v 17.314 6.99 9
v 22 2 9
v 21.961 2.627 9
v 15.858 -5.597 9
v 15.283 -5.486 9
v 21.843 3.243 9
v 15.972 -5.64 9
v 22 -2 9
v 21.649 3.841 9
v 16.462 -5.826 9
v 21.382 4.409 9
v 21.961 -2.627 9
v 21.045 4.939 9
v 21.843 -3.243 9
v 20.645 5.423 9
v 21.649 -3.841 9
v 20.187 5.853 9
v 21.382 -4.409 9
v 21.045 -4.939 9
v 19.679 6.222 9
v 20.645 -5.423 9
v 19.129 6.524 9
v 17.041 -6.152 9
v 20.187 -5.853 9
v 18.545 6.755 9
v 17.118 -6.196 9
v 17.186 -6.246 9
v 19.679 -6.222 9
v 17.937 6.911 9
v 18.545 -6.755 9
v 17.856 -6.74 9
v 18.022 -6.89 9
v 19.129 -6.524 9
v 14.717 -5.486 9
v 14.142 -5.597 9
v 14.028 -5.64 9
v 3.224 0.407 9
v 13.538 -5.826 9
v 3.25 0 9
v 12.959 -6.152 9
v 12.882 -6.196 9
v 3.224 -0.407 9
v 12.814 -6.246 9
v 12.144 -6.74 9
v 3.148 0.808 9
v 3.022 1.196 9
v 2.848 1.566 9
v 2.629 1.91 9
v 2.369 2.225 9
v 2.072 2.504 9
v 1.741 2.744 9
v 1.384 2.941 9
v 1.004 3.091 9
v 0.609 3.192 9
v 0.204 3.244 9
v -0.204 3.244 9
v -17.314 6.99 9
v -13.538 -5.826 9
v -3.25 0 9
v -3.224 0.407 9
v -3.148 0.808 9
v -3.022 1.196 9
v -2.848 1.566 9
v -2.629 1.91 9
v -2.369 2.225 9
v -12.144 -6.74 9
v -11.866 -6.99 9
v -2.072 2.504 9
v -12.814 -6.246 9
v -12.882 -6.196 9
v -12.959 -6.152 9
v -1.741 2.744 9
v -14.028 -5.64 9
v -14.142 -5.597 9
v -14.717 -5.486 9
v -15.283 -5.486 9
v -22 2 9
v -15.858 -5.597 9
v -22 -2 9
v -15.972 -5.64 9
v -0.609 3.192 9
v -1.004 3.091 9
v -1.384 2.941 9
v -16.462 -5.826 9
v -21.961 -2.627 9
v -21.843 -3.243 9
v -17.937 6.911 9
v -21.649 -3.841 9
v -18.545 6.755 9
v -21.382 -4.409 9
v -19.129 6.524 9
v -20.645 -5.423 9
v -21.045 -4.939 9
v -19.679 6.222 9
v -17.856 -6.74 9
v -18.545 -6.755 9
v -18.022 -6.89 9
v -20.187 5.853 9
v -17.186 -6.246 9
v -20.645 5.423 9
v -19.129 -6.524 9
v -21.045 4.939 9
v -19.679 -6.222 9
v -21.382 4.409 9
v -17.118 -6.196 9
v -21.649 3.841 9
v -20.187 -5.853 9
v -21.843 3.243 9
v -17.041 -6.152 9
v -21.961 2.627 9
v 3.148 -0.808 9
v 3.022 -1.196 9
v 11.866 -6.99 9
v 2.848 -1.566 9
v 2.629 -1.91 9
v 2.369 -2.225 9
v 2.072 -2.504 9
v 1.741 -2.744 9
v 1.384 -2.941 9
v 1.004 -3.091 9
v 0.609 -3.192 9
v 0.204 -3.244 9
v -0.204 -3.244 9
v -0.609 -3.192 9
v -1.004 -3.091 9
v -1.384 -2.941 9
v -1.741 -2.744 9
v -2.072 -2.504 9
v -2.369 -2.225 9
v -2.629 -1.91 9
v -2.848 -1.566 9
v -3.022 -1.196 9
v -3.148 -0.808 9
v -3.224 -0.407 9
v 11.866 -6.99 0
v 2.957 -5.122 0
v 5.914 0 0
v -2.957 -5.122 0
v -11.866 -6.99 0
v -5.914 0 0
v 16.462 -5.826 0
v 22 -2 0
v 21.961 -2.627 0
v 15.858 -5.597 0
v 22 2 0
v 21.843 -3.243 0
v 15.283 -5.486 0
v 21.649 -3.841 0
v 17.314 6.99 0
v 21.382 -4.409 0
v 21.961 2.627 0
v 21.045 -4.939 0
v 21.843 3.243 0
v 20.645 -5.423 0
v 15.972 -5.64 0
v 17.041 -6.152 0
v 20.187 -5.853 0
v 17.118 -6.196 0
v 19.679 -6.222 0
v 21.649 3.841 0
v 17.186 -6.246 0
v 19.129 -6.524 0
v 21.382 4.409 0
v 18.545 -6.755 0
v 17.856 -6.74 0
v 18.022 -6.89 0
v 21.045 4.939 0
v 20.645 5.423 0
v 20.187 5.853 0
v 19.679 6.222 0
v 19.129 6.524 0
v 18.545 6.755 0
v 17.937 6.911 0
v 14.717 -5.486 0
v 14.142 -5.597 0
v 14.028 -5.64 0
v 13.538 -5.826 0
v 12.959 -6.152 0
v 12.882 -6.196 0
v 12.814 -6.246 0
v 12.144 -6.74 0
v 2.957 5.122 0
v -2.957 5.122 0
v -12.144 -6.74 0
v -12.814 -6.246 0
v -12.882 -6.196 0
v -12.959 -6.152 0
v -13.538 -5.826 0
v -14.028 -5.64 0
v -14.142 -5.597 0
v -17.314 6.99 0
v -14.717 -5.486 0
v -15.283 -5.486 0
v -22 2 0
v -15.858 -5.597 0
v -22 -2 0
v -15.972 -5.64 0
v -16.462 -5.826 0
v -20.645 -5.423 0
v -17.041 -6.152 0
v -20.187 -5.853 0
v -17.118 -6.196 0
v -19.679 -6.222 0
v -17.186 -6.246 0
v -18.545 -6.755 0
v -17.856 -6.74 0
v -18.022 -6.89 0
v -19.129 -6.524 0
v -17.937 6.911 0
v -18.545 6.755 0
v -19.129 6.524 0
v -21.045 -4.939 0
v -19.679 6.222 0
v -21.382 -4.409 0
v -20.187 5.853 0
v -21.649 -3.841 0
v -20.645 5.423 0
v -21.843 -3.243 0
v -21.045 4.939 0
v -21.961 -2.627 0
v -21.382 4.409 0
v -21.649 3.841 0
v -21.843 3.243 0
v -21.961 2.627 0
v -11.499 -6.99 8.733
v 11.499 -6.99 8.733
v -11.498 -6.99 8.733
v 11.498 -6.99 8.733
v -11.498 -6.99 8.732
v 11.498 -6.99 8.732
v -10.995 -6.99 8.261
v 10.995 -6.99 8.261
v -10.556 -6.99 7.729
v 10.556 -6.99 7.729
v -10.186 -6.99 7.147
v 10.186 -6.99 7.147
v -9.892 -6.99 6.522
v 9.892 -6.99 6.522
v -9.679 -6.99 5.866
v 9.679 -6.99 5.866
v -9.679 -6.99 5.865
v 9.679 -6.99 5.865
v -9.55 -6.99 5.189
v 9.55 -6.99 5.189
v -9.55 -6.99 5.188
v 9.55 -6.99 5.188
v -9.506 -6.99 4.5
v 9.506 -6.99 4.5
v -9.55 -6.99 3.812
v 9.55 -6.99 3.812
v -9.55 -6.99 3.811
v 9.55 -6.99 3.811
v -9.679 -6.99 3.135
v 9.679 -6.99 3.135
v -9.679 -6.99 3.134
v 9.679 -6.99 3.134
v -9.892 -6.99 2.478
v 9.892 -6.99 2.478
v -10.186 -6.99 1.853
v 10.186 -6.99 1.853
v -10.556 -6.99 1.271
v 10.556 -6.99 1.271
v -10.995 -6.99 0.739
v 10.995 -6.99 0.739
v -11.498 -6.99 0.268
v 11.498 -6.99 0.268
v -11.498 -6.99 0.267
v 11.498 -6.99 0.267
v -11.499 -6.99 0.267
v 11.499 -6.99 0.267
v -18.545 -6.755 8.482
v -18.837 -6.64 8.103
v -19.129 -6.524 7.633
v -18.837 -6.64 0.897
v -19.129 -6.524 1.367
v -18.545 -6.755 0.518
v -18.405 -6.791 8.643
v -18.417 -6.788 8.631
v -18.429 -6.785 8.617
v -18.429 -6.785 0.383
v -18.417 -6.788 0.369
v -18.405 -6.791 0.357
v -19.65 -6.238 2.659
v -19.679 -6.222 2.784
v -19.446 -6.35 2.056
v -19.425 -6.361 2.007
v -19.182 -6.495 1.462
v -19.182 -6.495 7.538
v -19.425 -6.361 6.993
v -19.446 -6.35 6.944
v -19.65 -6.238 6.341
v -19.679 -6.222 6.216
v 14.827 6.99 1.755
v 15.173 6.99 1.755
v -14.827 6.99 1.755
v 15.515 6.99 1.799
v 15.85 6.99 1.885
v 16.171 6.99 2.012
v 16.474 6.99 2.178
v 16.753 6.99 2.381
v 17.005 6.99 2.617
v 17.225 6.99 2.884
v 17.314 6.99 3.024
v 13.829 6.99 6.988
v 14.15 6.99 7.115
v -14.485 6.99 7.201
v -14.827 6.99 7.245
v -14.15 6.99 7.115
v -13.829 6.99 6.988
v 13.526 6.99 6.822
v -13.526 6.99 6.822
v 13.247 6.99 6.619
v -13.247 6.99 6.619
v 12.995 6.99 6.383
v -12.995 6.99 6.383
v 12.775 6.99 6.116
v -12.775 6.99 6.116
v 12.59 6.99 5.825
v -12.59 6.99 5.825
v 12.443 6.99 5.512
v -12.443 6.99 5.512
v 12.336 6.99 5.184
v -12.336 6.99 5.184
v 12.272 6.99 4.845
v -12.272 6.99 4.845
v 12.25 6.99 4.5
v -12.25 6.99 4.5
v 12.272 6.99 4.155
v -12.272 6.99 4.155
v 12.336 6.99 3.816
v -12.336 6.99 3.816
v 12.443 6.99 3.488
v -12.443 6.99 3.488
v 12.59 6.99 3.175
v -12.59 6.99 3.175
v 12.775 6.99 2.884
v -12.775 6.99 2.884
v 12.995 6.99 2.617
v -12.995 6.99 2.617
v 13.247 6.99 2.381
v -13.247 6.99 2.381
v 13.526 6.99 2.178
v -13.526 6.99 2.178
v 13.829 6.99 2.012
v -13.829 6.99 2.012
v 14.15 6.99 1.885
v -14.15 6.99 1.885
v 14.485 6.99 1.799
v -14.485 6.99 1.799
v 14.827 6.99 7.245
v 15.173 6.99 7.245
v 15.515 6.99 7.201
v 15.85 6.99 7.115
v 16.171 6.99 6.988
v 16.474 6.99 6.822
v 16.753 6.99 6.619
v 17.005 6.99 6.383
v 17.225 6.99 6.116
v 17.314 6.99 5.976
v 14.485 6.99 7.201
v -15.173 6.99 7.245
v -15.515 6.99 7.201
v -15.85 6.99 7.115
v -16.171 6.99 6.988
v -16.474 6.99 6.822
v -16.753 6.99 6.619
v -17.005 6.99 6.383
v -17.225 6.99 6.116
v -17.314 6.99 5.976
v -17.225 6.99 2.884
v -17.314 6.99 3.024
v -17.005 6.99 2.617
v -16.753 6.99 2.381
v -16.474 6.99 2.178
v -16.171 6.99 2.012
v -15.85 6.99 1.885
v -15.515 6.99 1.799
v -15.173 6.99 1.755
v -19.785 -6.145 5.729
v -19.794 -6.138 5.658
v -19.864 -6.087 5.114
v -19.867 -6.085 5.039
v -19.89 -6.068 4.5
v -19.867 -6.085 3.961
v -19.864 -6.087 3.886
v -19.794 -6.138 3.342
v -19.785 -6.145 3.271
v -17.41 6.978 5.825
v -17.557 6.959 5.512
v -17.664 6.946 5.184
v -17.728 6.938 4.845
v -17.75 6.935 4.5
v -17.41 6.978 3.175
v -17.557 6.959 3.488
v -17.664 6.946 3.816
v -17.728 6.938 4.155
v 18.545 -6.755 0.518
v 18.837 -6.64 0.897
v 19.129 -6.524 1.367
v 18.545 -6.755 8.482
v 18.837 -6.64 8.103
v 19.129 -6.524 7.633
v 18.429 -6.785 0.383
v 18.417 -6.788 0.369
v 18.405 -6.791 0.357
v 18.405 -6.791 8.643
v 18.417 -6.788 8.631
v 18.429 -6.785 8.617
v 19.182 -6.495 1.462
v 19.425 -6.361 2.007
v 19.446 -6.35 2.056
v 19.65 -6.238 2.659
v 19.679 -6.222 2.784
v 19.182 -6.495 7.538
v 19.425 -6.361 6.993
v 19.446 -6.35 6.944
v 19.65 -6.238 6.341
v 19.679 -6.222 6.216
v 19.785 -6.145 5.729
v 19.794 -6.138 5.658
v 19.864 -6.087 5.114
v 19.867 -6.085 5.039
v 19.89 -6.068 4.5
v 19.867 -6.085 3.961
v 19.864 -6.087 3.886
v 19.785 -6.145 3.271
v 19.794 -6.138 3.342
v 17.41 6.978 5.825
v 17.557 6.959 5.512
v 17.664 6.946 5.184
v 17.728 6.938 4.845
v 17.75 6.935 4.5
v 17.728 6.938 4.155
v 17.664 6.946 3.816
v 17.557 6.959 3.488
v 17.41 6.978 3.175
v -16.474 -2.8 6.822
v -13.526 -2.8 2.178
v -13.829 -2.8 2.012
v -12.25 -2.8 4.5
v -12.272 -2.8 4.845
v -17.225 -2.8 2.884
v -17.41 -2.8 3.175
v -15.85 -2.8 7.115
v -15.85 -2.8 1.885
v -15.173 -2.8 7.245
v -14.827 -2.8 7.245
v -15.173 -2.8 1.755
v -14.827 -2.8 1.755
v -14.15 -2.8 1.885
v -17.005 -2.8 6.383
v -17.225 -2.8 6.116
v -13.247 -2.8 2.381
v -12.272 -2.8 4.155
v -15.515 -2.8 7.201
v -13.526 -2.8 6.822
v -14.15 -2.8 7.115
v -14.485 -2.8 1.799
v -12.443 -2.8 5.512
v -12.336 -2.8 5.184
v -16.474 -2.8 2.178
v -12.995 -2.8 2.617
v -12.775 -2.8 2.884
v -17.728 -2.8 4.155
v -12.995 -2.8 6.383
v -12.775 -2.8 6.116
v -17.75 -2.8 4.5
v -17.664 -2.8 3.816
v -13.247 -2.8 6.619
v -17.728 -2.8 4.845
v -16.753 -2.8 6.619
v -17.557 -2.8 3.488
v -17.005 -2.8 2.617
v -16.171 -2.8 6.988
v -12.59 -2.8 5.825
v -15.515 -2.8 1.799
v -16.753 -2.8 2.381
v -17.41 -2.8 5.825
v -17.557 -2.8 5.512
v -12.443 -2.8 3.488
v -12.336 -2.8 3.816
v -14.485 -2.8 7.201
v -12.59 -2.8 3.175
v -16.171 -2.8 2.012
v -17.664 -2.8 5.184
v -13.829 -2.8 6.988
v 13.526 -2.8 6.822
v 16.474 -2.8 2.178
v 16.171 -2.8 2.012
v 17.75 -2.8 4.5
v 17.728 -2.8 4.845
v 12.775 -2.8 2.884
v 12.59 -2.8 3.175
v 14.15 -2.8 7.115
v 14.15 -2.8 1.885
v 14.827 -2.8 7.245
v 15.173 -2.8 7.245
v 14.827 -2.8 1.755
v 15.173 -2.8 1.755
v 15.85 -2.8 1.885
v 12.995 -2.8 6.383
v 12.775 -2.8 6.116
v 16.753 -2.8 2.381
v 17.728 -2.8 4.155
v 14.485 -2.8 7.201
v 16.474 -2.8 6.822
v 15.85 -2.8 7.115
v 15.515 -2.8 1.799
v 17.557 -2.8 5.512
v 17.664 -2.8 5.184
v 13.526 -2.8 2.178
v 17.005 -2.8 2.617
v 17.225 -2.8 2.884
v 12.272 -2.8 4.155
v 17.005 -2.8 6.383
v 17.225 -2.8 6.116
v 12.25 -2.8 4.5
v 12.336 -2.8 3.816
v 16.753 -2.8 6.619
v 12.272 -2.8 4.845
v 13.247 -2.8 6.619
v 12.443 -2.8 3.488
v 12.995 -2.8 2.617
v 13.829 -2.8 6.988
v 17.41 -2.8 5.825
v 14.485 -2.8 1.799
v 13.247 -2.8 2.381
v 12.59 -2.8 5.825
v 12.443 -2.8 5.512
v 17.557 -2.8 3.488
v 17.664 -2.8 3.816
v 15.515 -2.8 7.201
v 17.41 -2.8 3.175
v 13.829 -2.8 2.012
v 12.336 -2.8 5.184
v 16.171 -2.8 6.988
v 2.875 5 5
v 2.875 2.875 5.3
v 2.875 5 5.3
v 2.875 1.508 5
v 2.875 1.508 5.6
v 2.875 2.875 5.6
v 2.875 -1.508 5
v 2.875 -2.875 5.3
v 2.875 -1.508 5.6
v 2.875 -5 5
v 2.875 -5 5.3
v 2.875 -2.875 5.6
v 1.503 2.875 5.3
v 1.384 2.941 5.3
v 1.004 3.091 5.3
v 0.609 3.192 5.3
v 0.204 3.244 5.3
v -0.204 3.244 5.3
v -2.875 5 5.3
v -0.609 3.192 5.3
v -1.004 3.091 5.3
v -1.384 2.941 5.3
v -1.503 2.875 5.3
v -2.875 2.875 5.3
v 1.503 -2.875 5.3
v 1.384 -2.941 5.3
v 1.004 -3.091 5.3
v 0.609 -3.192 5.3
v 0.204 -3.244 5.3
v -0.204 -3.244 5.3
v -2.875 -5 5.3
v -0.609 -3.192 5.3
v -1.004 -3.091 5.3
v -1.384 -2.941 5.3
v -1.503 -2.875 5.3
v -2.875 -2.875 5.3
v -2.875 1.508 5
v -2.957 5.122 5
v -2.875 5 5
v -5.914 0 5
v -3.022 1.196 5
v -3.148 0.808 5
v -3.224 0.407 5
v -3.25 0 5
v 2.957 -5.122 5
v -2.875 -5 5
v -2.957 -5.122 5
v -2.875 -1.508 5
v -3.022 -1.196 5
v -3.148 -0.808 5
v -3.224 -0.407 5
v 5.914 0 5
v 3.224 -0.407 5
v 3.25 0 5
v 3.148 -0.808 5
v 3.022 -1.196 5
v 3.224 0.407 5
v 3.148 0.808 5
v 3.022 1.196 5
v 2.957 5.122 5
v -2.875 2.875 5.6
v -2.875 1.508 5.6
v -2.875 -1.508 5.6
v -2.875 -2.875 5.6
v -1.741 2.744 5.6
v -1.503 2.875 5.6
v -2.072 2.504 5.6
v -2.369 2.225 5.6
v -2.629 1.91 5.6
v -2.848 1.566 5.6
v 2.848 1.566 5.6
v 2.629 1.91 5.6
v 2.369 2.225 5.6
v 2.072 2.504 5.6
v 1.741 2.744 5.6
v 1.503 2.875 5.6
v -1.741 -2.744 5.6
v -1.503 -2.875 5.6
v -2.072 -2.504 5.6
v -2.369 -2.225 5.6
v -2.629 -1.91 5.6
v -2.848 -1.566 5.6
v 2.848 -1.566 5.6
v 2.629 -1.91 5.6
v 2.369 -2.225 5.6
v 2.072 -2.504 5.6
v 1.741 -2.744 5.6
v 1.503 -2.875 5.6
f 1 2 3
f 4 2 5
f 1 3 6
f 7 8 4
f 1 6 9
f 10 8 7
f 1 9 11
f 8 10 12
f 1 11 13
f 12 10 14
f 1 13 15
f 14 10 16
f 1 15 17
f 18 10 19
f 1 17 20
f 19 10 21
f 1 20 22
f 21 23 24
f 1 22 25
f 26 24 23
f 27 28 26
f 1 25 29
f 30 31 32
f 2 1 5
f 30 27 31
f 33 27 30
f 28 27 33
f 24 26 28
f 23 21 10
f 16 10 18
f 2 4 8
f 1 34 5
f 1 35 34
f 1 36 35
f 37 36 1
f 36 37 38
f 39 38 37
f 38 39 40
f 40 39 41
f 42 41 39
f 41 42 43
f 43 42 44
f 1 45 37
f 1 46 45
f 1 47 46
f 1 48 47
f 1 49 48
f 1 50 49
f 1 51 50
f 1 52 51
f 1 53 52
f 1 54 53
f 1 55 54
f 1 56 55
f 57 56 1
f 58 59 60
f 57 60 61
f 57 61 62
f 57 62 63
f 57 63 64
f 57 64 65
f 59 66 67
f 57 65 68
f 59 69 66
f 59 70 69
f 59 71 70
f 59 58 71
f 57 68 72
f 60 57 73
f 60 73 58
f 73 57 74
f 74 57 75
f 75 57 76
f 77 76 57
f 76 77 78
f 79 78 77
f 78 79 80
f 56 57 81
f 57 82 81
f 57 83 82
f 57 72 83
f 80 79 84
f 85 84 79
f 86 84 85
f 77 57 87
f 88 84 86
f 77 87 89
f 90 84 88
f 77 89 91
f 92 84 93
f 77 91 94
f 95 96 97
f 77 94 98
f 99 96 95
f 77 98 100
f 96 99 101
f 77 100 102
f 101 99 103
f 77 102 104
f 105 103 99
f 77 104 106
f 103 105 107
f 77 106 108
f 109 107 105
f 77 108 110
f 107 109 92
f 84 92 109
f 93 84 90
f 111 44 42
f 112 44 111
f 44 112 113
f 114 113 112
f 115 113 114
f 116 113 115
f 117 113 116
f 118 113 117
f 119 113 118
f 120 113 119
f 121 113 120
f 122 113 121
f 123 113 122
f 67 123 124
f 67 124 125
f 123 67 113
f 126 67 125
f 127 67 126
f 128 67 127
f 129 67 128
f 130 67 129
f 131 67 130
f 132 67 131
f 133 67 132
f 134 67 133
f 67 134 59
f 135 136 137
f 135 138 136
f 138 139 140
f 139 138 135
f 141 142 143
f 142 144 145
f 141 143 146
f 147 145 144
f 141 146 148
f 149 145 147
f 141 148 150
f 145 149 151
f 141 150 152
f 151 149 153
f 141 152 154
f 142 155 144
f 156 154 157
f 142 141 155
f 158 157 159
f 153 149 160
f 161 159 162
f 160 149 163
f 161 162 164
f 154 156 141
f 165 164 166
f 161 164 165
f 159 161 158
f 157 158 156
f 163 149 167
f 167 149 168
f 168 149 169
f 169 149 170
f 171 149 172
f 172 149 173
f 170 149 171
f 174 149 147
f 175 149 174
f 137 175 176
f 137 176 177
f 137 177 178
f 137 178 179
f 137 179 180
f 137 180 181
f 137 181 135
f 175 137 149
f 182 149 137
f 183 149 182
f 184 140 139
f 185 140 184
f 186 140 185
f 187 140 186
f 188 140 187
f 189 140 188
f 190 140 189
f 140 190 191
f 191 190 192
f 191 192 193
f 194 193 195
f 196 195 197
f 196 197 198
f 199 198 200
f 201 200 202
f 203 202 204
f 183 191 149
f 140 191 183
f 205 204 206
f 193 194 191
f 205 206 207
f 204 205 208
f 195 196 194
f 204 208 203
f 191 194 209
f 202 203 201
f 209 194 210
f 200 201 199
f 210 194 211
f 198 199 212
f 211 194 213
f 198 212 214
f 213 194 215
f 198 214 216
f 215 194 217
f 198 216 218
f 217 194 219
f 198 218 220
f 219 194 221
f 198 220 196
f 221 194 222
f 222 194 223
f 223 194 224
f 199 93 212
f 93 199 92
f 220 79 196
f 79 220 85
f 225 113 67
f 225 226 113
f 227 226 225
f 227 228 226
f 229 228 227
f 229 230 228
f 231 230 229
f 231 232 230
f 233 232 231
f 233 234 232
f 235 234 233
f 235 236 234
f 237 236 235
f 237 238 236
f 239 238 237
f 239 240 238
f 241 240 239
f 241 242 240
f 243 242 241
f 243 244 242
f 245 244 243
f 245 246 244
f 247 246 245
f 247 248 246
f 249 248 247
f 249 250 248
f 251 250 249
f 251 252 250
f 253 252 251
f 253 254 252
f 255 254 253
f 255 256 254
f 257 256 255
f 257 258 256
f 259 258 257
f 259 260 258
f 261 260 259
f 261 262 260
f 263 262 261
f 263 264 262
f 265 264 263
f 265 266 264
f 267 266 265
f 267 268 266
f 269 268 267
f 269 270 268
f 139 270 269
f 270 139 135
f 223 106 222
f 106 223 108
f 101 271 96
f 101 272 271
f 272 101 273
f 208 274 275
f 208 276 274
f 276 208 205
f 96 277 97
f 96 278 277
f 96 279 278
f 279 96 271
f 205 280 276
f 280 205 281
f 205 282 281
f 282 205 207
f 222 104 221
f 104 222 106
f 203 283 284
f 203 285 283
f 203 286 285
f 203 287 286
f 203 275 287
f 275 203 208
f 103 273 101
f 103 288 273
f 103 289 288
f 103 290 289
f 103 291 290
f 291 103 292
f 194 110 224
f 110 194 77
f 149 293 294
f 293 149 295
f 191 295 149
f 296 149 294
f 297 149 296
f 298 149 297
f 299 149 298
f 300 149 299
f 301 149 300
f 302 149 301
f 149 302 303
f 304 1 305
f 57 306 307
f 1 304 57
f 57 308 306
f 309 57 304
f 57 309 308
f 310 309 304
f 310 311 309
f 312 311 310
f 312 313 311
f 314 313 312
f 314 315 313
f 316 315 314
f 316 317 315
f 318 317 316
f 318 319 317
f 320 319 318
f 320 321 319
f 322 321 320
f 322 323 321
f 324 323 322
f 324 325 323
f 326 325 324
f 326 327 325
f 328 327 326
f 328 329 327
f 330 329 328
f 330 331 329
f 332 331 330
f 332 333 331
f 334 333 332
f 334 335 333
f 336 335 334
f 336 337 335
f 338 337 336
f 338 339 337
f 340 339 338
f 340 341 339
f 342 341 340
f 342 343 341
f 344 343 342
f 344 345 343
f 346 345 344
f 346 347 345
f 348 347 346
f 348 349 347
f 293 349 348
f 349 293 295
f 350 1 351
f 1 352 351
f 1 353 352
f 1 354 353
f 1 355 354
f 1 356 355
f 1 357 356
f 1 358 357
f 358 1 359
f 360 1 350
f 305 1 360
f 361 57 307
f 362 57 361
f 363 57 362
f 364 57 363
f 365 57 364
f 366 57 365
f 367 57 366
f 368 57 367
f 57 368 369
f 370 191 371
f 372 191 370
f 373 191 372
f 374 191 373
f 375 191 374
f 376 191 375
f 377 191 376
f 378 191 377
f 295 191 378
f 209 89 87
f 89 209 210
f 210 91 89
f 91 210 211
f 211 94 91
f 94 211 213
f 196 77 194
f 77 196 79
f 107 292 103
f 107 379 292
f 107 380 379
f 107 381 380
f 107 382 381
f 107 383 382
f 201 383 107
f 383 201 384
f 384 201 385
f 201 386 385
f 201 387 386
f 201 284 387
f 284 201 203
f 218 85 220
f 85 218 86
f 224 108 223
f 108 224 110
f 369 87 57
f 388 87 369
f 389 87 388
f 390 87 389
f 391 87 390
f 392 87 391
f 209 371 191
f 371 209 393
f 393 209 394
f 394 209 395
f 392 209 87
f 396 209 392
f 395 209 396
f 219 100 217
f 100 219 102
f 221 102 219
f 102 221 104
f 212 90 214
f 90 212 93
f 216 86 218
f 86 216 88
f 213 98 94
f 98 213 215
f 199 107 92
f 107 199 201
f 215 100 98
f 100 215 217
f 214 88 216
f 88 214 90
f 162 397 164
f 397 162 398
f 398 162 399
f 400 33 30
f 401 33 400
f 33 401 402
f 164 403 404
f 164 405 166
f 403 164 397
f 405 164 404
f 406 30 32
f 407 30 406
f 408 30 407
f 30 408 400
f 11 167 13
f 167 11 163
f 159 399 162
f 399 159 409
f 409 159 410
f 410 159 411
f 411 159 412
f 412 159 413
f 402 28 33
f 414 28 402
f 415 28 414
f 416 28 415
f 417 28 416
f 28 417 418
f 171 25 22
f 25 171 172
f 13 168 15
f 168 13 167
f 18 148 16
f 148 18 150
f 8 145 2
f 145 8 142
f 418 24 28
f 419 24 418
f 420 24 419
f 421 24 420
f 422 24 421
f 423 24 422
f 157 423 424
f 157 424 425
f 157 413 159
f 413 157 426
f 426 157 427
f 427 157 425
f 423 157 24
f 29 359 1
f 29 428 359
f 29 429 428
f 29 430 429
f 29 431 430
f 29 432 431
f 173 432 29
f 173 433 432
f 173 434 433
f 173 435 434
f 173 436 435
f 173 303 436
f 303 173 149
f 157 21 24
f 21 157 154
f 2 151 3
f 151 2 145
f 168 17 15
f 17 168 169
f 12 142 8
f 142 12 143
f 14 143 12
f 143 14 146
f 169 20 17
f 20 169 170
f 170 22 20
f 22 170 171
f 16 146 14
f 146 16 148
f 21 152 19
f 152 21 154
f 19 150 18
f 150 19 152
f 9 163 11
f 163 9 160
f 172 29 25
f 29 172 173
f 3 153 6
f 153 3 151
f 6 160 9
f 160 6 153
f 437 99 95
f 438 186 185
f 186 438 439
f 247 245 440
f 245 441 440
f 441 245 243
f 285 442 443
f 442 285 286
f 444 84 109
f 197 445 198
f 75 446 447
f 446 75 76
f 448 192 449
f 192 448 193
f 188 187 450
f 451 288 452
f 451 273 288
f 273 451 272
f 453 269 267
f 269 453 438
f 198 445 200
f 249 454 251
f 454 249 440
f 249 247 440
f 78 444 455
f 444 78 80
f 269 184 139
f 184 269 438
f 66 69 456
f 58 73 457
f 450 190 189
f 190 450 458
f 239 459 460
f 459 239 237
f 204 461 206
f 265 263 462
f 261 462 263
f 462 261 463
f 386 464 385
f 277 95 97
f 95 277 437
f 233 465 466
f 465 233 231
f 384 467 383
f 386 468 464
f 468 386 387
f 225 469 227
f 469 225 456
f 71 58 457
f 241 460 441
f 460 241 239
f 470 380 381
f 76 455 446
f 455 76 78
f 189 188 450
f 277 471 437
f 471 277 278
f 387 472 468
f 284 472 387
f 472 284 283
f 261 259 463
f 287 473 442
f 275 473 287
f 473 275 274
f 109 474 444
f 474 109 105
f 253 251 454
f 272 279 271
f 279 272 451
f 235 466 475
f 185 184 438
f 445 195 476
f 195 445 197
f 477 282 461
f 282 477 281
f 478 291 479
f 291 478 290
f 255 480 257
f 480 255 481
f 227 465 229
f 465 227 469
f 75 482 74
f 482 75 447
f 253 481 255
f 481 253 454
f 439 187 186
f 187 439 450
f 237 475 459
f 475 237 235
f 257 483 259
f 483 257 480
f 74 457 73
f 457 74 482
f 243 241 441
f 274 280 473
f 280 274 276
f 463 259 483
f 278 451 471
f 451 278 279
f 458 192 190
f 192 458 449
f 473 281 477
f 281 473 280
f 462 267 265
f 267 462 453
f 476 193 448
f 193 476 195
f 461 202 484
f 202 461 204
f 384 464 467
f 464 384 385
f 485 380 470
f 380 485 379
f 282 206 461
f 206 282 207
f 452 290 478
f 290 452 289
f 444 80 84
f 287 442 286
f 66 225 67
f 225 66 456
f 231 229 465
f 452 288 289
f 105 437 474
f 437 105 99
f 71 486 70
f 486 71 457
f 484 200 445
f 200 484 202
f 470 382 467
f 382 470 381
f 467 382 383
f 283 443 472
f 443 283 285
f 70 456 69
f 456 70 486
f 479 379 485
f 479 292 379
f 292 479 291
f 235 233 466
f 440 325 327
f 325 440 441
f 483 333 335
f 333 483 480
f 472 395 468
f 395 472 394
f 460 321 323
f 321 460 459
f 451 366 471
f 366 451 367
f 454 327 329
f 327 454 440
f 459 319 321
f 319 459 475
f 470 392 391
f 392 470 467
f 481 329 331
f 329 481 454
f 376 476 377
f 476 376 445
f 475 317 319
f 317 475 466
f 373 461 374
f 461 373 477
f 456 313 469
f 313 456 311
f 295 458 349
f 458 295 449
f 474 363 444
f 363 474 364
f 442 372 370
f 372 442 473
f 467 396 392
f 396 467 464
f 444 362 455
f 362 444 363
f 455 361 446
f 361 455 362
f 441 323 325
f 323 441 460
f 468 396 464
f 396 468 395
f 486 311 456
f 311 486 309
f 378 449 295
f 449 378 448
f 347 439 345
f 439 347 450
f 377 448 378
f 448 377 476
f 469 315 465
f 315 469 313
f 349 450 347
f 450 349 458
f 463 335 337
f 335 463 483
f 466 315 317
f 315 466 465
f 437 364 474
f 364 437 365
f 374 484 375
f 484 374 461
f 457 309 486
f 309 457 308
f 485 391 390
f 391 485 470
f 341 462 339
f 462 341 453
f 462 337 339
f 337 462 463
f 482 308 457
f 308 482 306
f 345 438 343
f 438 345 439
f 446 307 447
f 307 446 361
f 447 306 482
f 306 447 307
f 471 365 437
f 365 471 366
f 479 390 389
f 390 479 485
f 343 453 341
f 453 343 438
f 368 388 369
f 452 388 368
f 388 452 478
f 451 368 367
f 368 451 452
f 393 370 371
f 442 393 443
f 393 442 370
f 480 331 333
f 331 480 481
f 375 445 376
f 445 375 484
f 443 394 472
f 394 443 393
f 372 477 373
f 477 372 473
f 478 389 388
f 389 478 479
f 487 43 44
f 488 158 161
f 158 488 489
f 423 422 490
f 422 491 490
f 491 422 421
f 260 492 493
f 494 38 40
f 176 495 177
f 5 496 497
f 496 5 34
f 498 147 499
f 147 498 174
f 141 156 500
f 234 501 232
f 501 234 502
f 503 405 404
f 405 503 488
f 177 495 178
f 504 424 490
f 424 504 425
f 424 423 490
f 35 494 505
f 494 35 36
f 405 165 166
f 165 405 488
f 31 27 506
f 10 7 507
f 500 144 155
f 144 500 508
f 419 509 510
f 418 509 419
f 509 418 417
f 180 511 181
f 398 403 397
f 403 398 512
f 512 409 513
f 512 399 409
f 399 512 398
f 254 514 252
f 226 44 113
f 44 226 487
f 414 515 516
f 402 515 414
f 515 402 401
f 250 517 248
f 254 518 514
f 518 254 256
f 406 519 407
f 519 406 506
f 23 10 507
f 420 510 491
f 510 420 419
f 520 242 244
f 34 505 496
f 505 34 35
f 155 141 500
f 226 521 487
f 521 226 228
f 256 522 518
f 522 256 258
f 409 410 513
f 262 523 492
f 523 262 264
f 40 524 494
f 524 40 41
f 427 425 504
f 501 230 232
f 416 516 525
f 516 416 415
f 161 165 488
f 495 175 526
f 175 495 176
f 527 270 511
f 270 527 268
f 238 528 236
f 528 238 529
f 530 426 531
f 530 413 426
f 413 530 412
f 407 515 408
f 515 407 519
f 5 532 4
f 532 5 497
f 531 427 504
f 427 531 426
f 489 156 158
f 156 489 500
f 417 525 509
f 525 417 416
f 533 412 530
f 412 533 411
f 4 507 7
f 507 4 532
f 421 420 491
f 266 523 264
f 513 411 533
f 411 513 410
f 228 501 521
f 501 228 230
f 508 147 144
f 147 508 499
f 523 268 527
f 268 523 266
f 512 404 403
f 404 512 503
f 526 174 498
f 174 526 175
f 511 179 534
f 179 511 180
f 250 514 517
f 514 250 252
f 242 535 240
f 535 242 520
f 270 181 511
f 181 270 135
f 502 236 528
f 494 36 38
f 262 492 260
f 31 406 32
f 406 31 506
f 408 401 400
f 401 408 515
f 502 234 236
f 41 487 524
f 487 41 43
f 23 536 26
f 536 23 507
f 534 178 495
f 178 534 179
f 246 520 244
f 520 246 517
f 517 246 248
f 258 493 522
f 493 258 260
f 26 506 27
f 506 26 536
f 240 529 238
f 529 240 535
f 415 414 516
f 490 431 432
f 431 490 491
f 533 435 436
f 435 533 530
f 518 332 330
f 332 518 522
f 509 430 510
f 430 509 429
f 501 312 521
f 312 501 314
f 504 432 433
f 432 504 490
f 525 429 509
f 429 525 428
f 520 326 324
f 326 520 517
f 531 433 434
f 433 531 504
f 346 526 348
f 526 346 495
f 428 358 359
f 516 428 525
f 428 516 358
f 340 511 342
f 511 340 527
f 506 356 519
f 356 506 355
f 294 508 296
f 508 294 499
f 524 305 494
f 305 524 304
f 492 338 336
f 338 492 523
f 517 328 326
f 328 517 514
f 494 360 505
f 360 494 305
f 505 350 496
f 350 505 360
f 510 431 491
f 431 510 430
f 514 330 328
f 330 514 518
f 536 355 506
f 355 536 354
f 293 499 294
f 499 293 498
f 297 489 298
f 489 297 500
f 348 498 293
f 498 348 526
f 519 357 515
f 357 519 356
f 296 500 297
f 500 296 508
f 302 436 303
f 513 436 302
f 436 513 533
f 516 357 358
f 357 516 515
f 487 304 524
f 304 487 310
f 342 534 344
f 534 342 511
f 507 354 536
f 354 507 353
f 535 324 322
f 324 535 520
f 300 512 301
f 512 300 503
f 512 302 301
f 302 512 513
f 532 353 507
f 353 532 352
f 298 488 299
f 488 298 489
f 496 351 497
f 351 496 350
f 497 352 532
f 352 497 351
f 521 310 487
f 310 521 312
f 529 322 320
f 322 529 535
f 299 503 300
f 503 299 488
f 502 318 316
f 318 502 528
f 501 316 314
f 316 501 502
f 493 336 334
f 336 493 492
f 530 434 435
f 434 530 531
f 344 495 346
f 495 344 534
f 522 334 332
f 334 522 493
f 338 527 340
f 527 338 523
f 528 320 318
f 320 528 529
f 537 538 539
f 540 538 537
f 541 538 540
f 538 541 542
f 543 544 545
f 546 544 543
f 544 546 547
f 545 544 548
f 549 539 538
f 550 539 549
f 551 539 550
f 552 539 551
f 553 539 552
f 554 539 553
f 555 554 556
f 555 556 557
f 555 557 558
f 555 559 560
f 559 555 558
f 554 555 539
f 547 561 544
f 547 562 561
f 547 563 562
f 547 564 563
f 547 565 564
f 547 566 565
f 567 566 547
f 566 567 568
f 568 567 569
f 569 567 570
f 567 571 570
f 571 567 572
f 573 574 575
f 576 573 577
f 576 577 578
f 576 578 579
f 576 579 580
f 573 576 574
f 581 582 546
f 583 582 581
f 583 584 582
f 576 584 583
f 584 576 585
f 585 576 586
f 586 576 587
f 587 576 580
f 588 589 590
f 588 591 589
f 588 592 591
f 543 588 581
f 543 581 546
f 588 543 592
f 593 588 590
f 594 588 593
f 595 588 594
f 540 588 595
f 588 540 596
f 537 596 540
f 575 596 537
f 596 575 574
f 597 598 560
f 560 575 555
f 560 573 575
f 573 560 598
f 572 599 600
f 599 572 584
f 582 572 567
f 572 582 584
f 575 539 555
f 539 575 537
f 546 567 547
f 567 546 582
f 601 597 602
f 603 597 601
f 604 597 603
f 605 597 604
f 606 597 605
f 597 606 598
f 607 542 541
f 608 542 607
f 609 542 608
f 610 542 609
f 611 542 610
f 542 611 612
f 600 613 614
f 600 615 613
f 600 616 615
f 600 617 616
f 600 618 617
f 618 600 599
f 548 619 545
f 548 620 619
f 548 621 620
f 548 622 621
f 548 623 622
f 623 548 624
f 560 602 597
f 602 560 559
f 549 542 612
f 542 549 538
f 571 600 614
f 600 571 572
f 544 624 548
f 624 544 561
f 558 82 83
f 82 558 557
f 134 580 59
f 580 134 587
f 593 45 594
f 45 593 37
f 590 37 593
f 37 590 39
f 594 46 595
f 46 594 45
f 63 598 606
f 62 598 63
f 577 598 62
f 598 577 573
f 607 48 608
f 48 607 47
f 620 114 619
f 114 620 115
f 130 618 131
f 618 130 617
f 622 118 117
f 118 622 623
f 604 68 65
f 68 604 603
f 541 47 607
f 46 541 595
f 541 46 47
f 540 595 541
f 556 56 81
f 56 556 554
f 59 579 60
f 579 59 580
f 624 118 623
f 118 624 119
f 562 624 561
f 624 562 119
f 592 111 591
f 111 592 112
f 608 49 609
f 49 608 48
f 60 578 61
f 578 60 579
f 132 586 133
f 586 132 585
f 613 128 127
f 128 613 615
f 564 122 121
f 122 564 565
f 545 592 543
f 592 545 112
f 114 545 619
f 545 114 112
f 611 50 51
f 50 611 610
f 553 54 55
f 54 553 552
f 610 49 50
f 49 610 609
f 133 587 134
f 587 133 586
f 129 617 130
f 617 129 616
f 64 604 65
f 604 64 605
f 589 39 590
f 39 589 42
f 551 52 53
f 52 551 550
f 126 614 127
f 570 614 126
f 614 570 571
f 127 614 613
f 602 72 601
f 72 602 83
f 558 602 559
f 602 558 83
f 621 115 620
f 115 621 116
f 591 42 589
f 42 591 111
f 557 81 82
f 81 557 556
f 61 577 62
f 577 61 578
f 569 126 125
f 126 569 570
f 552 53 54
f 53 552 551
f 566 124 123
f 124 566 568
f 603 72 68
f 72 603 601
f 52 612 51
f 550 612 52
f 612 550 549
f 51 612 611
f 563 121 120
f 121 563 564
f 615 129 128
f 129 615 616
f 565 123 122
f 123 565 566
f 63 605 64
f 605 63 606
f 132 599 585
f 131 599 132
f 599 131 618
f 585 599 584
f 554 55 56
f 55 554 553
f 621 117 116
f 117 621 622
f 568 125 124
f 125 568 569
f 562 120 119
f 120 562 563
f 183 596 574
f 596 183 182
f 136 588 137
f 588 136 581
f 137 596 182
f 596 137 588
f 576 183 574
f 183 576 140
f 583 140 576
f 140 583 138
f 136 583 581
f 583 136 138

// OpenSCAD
$fn = 50;


difference() {
	union() {
		cylinder(h = 9, r = 7.0000000000);
		translate(v = [-7.5000000000, 0.0000000000, 0]) {
			hull() {
				translate(v = [-9.5000000000, 2.0000000000, 0]) {
					cylinder(h = 9, r = 5);
				}
				translate(v = [9.5000000000, 2.0000000000, 0]) {
					cylinder(h = 9, r = 5);
				}
				translate(v = [-9.5000000000, -2.0000000000, 0]) {
					cylinder(h = 9, r = 5);
				}
				translate(v = [9.5000000000, -2.0000000000, 0]) {
					cylinder(h = 9, r = 5);
				}
			}
		}
		translate(v = [7.5000000000, 0.0000000000, 0]) {
			hull() {
				translate(v = [-9.5000000000, 2.0000000000, 0]) {
					cylinder(h = 9, r = 5);
				}
				translate(v = [9.5000000000, 2.0000000000, 0]) {
					cylinder(h = 9, r = 5);
				}
				translate(v = [-9.5000000000, -2.0000000000, 0]) {
					cylinder(h = 9, r = 5);
				}
				translate(v = [9.5000000000, -2.0000000000, 0]) {
					cylinder(h = 9, r = 5);
				}
			}
		}
	}
	union() {
		translate(v = [-15.0000000000, -7.0000000000, 4.5000000000]) {
			rotate(a = [90, 0, 0]) {
				difference() {
					union() {
						#translate(v = [0, 0, -14.0000000000]) {
							cylinder(h = 14, r = 2.2500000000);
						}
						#translate(v = [0, 0, -4.2000000000]) {
							cylinder(h = 4.2000000000, r1 = 2.7500000000, r2 = 5.5000000000);
						}
						#translate(v = [0, 0, -14.0000000000]) {
							cylinder(h = 14, r = 2.7500000000);
						}
						#translate(v = [0, 0, -14.0000000000]) {
							cylinder(h = 14, r = 2.2500000000);
						}
					}
					union();
				}
			}
		}
		translate(v = [15.0000000000, -7.0000000000, 4.5000000000]) {
			rotate(a = [90, 0, 0]) {
				difference() {
					union() {
						#translate(v = [0, 0, -14.0000000000]) {
							cylinder(h = 14, r = 2.2500000000);
						}
						#translate(v = [0, 0, -4.2000000000]) {
							cylinder(h = 4.2000000000, r1 = 2.7500000000, r2 = 5.5000000000);
						}
						#translate(v = [0, 0, -14.0000000000]) {
							cylinder(h = 14, r = 2.7500000000);
						}
						#translate(v = [0, 0, -14.0000000000]) {
							cylinder(h = 14, r = 2.2500000000);
						}
					}
					union();
				}
			}
		}
		translate(v = [0.0000000000, 0.0000000000, 0]) {
			rotate(a = [0, 0, 0]) {
				difference() {
					union() {
						#translate(v = [-2.8750000000, -5.0000000000, -0.3000000000]) {
							cube(size = [5.7500000000, 10, 0.3000000000]);
						}
						#translate(v = [-2.8750000000, -2.8750000000, -0.6000000000]) {
							cube(size = [5.7500000000, 5.7500000000, 0.3000000000]);
						}
						#translate(v = [-2.8750000000, -5.0000000000, 5]) {
							cube(size = [5.7500000000, 10, 0.3000000000]);
						}
						#translate(v = [-2.8750000000, -2.8750000000, 5.3000000000]) {
							cube(size = [5.7500000000, 5.7500000000, 0.3000000000]);
						}
						#translate(v = [0, 0, -100.0000000000]) {
							cylinder(h = 200, r = 3.2500000000);
						}
						#linear_extrude(height = 5) {
							polygon(points = [[5.9142500000, 0.0000000000], [2.9571250000, 5.1218907443], [-2.9571250000, 5.1218907443], [-5.9142500000, 0.0000000000], [-2.9571250000, -5.1218907443], [2.9571250000, -5.1218907443]]);
						}
						#translate(v = [-2.8750000000, -5.0000000000, -0.3000000000]) {
							cube(size = [5.7500000000, 10, 0.3000000000]);
						}
						#translate(v = [-2.8750000000, -2.8750000000, -0.6000000000]) {
							cube(size = [5.7500000000, 5.7500000000, 0.3000000000]);
						}
						#translate(v = [-2.8750000000, -5.0000000000, 5]) {
							cube(size = [5.7500000000, 10, 0.3000000000]);
						}
						#translate(v = [-2.8750000000, -2.8750000000, 5.3000000000]) {
							cube(size = [5.7500000000, 5.7500000000, 0.3000000000]);
						}
						#translate(v = [0, 0, -100.0000000000]) {
							cylinder(h = 200, r = 3.2500000000);
						}
						#translate(v = [-2.8750000000, -5.0000000000, -0.3000000000]) {
							cube(size = [5.7500000000, 10, 0.3000000000]);
						}
						#translate(v = [-2.8750000000, -2.8750000000, -0.6000000000]) {
							cube(size = [5.7500000000, 5.7500000000, 0.3000000000]);
						}
						#translate(v = [-2.8750000000, -5.0000000000, 5]) {
							cube(size = [5.7500000000, 10, 0.3000000000]);
						}
						#translate(v = [-2.8750000000, -2.8750000000, 5.3000000000]) {
							cube(size = [5.7500000000, 5.7500000000, 0.3000000000]);
						}
						#translate(v = [0, 0, -100.0000000000]) {
							cylinder(h = 200, r = 3.2500000000);
						}
					}
					union();
				}
			}
		}
		translate(v = [0, 0, -100]) {
			cylinder(h = 200, r = 3.2500000000);
		}
		translate(v = [0, 0, -100]) {
			cylinder(h = 200, r = 1.8000000000);
		}
	}
}
